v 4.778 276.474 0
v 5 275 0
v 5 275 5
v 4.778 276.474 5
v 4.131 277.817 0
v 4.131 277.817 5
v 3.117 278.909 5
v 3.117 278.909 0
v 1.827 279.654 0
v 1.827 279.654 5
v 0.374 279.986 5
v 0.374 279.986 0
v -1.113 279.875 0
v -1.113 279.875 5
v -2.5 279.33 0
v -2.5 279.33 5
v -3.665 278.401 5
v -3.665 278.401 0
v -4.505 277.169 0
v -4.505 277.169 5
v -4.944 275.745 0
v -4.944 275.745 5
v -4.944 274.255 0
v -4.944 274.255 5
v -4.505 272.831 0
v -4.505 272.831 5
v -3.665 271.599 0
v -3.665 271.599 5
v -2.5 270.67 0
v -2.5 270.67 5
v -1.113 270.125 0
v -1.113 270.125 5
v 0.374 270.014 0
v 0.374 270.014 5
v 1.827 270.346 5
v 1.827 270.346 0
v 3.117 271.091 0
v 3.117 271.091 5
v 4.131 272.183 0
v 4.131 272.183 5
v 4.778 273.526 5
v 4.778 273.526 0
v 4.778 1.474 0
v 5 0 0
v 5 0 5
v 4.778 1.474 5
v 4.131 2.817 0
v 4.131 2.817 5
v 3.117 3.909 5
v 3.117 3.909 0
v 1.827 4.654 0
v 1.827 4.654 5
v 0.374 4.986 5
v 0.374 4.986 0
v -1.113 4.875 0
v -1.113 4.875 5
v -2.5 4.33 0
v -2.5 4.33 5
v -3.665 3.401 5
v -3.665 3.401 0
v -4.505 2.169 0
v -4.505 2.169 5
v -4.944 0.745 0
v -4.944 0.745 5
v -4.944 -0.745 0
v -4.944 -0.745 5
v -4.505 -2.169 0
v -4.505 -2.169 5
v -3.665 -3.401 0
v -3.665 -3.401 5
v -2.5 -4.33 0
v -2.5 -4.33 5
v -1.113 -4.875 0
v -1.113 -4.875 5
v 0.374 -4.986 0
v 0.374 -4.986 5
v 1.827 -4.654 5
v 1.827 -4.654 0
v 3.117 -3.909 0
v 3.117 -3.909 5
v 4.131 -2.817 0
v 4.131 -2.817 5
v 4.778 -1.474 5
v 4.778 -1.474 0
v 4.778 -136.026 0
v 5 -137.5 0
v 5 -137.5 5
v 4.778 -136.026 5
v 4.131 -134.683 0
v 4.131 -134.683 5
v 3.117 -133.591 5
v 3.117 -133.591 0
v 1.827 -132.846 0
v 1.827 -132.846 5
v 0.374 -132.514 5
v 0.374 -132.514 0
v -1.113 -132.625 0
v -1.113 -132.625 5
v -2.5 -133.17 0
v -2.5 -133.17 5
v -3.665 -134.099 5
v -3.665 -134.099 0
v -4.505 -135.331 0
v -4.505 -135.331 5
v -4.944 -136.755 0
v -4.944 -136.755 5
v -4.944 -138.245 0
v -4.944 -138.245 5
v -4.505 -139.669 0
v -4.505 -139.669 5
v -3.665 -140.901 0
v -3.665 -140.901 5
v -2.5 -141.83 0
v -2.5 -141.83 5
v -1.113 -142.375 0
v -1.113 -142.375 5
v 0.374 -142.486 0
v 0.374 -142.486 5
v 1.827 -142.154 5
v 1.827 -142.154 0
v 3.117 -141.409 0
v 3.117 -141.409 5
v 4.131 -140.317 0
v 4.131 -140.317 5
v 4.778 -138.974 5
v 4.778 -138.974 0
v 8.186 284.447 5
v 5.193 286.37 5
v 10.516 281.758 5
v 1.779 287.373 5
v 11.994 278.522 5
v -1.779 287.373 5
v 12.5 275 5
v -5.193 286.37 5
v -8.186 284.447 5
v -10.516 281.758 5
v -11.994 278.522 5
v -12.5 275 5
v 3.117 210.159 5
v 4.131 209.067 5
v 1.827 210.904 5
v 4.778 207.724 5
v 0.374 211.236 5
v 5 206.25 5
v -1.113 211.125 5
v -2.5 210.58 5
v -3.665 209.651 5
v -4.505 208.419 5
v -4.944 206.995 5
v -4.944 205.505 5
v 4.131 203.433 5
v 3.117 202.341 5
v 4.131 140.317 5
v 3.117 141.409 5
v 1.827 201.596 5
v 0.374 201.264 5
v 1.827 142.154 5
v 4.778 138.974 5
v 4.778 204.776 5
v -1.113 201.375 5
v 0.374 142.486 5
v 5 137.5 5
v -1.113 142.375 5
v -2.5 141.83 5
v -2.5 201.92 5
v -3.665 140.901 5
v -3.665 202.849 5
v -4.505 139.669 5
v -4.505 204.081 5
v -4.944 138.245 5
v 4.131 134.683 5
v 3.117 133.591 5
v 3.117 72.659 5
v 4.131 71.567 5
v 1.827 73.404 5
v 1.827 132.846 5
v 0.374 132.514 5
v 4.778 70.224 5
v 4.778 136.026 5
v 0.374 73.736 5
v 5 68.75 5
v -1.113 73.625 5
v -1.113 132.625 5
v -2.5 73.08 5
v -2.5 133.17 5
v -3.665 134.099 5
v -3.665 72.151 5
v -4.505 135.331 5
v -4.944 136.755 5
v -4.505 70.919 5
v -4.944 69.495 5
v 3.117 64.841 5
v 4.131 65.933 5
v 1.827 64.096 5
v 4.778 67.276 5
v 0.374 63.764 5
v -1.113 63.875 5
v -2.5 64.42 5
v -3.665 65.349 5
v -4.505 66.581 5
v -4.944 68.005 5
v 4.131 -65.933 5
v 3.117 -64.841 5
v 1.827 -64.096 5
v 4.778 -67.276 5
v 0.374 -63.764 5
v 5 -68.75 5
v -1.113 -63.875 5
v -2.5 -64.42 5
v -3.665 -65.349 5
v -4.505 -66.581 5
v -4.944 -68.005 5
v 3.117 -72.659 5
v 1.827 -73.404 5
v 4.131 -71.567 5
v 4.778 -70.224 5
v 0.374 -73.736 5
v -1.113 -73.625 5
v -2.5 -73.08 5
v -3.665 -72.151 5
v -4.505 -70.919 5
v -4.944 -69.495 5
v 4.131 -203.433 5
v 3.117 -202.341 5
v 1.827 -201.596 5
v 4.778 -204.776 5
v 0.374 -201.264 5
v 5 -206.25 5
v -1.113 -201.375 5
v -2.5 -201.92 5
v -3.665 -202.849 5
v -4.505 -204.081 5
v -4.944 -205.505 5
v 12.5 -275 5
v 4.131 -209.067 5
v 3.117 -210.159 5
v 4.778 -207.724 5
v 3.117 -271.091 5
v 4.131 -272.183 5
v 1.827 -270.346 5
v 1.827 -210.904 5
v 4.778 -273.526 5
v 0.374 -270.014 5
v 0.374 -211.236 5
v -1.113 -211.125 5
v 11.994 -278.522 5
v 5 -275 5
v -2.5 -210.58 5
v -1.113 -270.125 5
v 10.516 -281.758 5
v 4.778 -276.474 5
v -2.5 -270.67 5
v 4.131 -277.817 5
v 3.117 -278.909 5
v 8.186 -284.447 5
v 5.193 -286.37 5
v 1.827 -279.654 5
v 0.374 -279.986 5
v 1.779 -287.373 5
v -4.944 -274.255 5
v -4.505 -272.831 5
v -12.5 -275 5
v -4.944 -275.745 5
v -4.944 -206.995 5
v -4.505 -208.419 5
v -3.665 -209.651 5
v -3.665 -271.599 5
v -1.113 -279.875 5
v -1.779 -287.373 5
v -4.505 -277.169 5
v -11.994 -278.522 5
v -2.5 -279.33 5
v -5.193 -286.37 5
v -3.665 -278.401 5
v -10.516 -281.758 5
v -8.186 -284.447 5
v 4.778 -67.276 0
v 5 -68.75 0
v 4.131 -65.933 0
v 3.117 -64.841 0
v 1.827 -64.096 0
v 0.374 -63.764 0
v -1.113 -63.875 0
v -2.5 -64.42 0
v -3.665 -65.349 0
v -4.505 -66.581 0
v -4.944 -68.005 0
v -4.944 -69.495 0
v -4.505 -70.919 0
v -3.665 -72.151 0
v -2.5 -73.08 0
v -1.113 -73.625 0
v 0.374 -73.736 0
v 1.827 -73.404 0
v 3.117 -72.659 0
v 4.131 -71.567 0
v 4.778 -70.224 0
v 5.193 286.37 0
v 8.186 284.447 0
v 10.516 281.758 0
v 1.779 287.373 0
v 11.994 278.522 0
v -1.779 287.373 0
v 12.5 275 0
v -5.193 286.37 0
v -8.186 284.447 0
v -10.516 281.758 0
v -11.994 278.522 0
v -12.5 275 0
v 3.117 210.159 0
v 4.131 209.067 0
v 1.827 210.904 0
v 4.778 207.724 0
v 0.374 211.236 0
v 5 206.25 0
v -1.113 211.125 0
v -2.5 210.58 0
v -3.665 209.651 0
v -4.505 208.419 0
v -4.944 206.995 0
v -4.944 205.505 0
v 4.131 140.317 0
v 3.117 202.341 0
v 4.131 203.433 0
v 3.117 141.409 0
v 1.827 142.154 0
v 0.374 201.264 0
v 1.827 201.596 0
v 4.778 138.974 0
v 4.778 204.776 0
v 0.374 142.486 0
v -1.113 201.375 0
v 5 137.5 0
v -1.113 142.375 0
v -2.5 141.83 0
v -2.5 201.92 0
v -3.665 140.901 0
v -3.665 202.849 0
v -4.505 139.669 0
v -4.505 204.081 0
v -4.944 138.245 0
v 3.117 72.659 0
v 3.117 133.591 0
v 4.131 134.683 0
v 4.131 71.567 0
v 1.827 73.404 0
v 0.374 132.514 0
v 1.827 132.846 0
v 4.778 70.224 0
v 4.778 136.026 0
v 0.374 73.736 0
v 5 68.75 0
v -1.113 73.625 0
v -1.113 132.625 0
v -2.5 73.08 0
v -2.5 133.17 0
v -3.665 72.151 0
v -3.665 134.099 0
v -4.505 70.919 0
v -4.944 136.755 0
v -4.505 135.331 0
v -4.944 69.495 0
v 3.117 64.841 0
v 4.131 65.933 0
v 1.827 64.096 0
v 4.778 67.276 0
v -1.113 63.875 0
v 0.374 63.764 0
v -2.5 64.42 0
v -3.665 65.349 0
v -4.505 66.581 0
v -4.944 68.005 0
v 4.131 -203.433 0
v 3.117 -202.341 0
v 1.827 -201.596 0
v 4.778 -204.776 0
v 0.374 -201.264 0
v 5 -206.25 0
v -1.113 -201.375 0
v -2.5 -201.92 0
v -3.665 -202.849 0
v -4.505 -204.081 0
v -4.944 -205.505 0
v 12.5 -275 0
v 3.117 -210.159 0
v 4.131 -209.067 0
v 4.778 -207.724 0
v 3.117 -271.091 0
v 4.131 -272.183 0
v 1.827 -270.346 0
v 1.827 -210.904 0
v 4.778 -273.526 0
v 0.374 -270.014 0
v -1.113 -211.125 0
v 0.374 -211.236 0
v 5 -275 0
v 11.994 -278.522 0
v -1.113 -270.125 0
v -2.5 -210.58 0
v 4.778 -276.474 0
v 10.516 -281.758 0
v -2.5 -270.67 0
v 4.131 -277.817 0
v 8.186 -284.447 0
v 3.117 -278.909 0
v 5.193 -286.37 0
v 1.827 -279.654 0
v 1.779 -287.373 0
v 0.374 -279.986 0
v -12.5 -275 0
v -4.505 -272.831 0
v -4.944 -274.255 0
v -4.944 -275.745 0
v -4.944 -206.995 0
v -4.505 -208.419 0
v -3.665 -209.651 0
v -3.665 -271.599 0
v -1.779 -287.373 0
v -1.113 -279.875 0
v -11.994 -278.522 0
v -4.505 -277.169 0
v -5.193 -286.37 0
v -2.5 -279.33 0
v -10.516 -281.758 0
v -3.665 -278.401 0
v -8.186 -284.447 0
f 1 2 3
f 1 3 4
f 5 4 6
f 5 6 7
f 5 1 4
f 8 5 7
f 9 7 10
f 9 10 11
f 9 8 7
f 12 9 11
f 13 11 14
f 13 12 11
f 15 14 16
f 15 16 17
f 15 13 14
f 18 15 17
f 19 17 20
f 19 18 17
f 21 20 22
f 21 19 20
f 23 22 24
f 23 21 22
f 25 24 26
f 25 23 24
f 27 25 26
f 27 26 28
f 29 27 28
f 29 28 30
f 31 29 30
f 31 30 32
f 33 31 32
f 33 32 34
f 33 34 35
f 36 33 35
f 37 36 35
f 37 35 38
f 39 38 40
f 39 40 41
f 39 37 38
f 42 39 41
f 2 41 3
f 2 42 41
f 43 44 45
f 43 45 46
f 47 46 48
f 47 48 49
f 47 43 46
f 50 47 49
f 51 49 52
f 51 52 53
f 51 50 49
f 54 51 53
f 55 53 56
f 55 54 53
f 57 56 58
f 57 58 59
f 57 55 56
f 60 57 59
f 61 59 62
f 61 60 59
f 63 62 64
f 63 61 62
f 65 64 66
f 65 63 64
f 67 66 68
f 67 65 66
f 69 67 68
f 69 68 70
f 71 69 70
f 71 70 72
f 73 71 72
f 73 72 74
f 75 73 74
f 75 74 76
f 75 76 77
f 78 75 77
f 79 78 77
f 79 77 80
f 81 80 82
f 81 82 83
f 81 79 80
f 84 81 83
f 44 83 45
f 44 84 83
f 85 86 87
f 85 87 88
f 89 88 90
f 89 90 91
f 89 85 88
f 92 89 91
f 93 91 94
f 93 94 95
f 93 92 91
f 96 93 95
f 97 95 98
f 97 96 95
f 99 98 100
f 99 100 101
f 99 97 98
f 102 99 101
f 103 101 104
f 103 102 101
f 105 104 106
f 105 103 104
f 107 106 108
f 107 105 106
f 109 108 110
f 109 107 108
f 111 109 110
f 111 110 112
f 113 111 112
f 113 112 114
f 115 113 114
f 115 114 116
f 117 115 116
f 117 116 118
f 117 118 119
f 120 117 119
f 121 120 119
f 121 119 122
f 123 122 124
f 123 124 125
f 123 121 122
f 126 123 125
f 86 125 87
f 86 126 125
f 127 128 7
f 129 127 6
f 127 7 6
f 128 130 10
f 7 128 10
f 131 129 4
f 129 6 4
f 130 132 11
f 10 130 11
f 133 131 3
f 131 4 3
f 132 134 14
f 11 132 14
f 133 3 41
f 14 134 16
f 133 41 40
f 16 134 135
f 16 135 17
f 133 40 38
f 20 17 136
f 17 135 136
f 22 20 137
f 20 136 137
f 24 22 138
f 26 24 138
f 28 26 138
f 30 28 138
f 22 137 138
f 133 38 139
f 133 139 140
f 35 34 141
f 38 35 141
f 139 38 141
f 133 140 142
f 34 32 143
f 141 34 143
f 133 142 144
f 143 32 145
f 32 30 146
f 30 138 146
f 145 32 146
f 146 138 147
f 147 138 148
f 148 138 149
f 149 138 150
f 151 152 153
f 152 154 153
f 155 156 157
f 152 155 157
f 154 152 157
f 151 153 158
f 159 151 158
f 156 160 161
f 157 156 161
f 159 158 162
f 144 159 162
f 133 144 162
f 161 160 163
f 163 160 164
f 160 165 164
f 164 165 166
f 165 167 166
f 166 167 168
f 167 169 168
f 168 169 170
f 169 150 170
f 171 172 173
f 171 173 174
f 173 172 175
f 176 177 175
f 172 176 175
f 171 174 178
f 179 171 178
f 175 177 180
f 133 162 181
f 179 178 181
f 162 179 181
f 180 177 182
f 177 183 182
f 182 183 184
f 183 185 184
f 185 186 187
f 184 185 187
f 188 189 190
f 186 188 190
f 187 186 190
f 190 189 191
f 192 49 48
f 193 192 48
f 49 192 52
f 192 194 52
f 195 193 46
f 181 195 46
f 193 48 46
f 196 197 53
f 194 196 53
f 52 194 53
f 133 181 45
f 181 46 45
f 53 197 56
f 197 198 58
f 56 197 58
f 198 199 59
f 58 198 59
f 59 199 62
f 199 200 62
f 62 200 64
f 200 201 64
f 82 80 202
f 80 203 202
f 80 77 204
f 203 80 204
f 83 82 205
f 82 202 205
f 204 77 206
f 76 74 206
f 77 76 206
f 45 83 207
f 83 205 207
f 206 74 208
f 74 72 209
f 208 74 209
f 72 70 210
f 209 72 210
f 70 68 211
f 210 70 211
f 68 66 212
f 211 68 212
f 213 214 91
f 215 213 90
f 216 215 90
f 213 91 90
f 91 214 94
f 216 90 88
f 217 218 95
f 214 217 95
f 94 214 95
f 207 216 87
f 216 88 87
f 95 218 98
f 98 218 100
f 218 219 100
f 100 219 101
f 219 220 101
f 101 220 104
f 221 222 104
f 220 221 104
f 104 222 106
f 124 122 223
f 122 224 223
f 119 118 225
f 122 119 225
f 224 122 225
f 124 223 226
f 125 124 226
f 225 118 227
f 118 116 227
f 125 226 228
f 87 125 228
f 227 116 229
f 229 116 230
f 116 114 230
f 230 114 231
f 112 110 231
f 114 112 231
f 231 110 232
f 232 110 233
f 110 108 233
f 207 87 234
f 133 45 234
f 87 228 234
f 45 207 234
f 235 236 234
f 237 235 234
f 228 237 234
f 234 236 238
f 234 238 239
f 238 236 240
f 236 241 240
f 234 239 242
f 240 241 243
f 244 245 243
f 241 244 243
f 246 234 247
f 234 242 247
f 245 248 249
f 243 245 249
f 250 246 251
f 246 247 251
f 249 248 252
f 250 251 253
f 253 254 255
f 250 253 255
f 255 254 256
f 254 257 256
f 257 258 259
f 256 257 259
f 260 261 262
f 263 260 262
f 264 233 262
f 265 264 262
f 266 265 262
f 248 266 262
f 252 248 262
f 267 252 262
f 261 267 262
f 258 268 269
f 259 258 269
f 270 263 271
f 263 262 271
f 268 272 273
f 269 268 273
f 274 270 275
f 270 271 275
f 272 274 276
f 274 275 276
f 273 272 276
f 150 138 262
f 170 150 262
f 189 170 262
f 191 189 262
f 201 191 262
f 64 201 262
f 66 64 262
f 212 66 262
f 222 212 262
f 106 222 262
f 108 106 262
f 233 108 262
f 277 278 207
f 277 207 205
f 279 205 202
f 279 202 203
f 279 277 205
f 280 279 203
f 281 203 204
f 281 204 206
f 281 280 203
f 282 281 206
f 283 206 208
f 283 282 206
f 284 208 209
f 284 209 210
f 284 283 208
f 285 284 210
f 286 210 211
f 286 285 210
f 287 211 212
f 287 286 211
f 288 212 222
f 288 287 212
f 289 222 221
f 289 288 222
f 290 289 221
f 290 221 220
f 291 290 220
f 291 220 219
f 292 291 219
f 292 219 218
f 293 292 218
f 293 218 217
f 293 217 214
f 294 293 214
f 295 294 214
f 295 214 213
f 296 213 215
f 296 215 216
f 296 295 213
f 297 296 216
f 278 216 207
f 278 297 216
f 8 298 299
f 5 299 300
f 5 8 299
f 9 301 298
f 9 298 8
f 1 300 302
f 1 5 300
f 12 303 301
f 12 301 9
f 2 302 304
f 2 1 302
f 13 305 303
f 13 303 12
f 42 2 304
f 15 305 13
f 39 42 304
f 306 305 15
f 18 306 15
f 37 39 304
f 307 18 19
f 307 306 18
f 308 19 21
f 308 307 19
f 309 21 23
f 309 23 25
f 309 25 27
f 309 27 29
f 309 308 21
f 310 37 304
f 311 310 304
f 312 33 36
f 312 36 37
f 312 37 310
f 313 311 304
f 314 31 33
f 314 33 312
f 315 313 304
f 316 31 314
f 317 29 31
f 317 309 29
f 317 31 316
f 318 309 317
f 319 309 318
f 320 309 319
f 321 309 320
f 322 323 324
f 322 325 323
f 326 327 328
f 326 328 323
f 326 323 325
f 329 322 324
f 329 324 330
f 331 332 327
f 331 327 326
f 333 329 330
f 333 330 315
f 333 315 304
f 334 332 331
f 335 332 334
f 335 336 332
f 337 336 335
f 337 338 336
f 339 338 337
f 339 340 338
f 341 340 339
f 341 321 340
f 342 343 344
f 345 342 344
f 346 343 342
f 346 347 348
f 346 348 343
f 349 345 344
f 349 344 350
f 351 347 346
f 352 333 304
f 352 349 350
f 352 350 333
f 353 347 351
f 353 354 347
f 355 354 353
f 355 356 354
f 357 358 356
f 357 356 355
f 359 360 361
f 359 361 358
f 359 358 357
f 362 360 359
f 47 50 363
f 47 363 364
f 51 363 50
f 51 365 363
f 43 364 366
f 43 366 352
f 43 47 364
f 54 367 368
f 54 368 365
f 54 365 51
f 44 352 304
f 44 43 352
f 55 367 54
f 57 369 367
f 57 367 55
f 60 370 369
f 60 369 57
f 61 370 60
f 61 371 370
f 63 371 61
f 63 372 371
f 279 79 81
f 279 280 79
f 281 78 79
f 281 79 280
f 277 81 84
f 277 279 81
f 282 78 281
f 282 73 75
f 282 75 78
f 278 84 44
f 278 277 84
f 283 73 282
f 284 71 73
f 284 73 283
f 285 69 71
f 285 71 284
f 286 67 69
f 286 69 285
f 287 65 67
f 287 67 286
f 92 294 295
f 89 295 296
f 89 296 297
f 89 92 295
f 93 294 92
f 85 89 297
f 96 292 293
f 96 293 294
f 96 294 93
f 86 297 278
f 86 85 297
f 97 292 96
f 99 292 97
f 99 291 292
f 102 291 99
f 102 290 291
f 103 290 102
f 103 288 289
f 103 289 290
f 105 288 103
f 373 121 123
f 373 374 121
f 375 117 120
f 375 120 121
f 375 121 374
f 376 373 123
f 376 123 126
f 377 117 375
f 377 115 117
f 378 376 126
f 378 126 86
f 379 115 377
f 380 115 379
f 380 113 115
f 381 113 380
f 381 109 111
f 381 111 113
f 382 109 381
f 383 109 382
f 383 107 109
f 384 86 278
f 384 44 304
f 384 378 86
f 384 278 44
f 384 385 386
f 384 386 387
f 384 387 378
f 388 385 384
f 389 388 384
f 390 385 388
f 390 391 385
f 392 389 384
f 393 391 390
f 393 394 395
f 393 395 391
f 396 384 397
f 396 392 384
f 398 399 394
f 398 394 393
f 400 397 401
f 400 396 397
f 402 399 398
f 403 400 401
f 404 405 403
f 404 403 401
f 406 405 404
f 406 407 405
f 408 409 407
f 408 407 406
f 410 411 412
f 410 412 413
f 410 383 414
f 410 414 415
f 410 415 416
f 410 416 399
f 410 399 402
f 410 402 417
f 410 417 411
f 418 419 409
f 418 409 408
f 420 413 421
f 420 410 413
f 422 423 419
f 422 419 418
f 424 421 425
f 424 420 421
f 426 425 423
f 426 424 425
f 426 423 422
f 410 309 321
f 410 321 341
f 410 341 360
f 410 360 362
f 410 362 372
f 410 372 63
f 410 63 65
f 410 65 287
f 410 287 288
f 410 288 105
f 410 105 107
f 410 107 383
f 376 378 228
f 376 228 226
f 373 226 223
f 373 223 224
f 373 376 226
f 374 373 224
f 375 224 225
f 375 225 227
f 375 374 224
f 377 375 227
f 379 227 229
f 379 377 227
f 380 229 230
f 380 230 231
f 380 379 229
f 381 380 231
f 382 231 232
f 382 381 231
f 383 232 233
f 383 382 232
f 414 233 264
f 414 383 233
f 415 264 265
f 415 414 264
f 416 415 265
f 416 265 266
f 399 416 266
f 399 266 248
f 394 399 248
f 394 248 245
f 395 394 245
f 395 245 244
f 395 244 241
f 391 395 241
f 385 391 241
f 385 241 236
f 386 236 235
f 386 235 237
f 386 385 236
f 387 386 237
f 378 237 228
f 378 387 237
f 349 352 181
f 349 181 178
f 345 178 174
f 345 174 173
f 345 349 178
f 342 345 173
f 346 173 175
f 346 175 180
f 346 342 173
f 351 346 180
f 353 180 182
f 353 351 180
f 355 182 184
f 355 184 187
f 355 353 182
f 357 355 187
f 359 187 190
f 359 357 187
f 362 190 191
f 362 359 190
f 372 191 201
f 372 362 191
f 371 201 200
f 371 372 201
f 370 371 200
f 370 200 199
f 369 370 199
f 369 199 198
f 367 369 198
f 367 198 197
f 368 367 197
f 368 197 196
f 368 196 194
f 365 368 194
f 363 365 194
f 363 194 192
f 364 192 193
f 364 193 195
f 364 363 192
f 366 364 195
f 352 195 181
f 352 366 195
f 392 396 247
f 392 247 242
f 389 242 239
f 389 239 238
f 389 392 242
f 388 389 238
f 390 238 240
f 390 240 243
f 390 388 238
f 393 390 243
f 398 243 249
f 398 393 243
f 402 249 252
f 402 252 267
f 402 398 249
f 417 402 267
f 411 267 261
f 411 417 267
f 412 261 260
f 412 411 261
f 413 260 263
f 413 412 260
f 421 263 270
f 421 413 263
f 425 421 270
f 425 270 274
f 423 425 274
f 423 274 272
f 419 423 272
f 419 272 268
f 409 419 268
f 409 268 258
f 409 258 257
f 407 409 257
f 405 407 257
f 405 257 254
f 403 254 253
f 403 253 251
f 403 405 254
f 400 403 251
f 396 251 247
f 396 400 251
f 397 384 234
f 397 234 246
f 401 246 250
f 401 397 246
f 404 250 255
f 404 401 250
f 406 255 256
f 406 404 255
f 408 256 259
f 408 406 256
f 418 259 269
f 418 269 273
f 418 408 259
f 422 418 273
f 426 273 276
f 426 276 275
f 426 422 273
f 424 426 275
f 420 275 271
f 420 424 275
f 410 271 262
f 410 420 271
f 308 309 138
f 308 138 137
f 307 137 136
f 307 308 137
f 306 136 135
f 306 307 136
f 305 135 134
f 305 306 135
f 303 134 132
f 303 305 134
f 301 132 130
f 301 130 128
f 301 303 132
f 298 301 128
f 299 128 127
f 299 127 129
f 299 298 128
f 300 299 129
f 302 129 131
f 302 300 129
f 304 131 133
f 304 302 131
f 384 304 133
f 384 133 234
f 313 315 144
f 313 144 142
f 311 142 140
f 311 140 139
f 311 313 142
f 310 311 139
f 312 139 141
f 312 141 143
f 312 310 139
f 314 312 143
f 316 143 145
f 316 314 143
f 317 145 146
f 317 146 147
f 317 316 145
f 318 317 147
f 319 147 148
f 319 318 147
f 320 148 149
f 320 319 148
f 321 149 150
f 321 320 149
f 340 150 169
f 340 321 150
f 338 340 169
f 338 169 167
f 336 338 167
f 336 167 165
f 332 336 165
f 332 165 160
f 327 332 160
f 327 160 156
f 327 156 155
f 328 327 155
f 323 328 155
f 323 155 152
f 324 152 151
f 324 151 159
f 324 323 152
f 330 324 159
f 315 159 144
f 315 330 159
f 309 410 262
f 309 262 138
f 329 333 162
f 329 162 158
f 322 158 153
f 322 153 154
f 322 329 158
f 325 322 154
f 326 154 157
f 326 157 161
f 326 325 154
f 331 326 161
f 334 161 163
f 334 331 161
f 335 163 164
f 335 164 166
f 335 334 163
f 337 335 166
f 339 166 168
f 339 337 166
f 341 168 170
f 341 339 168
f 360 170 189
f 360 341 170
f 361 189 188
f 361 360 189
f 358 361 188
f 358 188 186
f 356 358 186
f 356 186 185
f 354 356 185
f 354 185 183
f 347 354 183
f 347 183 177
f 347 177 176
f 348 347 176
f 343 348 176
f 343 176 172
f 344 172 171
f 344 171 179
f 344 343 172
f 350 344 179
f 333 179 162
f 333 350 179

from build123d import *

# Parameters (mm, degrees)
SKETCH2_R           = 5
BOSS_EXTRUDE1_DEPTH = 5


with BuildPart() as part:
    # Sketch2 → Boss-Extrude1 (new body)
    with BuildSketch(Plane(origin=(0, 0, 0), x_dir=(0, 1, 0), z_dir=(0, 0, 1))):
        with BuildLine():
            Line((-275, 12.5), (275, 12.5))
            ThreePointArc((275, 12.5), (287.5, 0), (275, -12.5))
            Line((275, -12.5), (-275, -12.5))
            ThreePointArc((-275, -12.5), (-287.5, 0), (-275, 12.5))
        make_face()
        with Locations(Location((-275, 0, 0), (0, 0, 270))):
            Circle(SKETCH2_R, mode=Mode.SUBTRACT)
        with Locations(Location((-206.25, 0, 0), (0, 0, 270))):
            Circle(SKETCH2_R, mode=Mode.SUBTRACT)
        with Locations(Location((-137.5, 0, 0), (0, 0, 270))):
            Circle(SKETCH2_R, mode=Mode.SUBTRACT)
        with Locations(Location((-68.75, 0, 0), (0, 0, 270))):
            Circle(SKETCH2_R, mode=Mode.SUBTRACT)
        with Locations(Location((0, 0, 0), (0, 0, 270))):
            Circle(SKETCH2_R, mode=Mode.SUBTRACT)
        with Locations(Location((68.75, 0, 0), (0, 0, 270))):
            Circle(SKETCH2_R, mode=Mode.SUBTRACT)
        with Locations(Location((137.5, 0, 0), (0, 0, 270))):
            Circle(SKETCH2_R, mode=Mode.SUBTRACT)
        with Locations(Location((206.25, 0, 0), (0, 0, 270))):
            Circle(SKETCH2_R, mode=Mode.SUBTRACT)
        with Locations(Location((275, 0, 0), (0, 0, 270))):
            Circle(SKETCH2_R, mode=Mode.SUBTRACT)
    extrude(amount=BOSS_EXTRUDE1_DEPTH)


solid = part.part
